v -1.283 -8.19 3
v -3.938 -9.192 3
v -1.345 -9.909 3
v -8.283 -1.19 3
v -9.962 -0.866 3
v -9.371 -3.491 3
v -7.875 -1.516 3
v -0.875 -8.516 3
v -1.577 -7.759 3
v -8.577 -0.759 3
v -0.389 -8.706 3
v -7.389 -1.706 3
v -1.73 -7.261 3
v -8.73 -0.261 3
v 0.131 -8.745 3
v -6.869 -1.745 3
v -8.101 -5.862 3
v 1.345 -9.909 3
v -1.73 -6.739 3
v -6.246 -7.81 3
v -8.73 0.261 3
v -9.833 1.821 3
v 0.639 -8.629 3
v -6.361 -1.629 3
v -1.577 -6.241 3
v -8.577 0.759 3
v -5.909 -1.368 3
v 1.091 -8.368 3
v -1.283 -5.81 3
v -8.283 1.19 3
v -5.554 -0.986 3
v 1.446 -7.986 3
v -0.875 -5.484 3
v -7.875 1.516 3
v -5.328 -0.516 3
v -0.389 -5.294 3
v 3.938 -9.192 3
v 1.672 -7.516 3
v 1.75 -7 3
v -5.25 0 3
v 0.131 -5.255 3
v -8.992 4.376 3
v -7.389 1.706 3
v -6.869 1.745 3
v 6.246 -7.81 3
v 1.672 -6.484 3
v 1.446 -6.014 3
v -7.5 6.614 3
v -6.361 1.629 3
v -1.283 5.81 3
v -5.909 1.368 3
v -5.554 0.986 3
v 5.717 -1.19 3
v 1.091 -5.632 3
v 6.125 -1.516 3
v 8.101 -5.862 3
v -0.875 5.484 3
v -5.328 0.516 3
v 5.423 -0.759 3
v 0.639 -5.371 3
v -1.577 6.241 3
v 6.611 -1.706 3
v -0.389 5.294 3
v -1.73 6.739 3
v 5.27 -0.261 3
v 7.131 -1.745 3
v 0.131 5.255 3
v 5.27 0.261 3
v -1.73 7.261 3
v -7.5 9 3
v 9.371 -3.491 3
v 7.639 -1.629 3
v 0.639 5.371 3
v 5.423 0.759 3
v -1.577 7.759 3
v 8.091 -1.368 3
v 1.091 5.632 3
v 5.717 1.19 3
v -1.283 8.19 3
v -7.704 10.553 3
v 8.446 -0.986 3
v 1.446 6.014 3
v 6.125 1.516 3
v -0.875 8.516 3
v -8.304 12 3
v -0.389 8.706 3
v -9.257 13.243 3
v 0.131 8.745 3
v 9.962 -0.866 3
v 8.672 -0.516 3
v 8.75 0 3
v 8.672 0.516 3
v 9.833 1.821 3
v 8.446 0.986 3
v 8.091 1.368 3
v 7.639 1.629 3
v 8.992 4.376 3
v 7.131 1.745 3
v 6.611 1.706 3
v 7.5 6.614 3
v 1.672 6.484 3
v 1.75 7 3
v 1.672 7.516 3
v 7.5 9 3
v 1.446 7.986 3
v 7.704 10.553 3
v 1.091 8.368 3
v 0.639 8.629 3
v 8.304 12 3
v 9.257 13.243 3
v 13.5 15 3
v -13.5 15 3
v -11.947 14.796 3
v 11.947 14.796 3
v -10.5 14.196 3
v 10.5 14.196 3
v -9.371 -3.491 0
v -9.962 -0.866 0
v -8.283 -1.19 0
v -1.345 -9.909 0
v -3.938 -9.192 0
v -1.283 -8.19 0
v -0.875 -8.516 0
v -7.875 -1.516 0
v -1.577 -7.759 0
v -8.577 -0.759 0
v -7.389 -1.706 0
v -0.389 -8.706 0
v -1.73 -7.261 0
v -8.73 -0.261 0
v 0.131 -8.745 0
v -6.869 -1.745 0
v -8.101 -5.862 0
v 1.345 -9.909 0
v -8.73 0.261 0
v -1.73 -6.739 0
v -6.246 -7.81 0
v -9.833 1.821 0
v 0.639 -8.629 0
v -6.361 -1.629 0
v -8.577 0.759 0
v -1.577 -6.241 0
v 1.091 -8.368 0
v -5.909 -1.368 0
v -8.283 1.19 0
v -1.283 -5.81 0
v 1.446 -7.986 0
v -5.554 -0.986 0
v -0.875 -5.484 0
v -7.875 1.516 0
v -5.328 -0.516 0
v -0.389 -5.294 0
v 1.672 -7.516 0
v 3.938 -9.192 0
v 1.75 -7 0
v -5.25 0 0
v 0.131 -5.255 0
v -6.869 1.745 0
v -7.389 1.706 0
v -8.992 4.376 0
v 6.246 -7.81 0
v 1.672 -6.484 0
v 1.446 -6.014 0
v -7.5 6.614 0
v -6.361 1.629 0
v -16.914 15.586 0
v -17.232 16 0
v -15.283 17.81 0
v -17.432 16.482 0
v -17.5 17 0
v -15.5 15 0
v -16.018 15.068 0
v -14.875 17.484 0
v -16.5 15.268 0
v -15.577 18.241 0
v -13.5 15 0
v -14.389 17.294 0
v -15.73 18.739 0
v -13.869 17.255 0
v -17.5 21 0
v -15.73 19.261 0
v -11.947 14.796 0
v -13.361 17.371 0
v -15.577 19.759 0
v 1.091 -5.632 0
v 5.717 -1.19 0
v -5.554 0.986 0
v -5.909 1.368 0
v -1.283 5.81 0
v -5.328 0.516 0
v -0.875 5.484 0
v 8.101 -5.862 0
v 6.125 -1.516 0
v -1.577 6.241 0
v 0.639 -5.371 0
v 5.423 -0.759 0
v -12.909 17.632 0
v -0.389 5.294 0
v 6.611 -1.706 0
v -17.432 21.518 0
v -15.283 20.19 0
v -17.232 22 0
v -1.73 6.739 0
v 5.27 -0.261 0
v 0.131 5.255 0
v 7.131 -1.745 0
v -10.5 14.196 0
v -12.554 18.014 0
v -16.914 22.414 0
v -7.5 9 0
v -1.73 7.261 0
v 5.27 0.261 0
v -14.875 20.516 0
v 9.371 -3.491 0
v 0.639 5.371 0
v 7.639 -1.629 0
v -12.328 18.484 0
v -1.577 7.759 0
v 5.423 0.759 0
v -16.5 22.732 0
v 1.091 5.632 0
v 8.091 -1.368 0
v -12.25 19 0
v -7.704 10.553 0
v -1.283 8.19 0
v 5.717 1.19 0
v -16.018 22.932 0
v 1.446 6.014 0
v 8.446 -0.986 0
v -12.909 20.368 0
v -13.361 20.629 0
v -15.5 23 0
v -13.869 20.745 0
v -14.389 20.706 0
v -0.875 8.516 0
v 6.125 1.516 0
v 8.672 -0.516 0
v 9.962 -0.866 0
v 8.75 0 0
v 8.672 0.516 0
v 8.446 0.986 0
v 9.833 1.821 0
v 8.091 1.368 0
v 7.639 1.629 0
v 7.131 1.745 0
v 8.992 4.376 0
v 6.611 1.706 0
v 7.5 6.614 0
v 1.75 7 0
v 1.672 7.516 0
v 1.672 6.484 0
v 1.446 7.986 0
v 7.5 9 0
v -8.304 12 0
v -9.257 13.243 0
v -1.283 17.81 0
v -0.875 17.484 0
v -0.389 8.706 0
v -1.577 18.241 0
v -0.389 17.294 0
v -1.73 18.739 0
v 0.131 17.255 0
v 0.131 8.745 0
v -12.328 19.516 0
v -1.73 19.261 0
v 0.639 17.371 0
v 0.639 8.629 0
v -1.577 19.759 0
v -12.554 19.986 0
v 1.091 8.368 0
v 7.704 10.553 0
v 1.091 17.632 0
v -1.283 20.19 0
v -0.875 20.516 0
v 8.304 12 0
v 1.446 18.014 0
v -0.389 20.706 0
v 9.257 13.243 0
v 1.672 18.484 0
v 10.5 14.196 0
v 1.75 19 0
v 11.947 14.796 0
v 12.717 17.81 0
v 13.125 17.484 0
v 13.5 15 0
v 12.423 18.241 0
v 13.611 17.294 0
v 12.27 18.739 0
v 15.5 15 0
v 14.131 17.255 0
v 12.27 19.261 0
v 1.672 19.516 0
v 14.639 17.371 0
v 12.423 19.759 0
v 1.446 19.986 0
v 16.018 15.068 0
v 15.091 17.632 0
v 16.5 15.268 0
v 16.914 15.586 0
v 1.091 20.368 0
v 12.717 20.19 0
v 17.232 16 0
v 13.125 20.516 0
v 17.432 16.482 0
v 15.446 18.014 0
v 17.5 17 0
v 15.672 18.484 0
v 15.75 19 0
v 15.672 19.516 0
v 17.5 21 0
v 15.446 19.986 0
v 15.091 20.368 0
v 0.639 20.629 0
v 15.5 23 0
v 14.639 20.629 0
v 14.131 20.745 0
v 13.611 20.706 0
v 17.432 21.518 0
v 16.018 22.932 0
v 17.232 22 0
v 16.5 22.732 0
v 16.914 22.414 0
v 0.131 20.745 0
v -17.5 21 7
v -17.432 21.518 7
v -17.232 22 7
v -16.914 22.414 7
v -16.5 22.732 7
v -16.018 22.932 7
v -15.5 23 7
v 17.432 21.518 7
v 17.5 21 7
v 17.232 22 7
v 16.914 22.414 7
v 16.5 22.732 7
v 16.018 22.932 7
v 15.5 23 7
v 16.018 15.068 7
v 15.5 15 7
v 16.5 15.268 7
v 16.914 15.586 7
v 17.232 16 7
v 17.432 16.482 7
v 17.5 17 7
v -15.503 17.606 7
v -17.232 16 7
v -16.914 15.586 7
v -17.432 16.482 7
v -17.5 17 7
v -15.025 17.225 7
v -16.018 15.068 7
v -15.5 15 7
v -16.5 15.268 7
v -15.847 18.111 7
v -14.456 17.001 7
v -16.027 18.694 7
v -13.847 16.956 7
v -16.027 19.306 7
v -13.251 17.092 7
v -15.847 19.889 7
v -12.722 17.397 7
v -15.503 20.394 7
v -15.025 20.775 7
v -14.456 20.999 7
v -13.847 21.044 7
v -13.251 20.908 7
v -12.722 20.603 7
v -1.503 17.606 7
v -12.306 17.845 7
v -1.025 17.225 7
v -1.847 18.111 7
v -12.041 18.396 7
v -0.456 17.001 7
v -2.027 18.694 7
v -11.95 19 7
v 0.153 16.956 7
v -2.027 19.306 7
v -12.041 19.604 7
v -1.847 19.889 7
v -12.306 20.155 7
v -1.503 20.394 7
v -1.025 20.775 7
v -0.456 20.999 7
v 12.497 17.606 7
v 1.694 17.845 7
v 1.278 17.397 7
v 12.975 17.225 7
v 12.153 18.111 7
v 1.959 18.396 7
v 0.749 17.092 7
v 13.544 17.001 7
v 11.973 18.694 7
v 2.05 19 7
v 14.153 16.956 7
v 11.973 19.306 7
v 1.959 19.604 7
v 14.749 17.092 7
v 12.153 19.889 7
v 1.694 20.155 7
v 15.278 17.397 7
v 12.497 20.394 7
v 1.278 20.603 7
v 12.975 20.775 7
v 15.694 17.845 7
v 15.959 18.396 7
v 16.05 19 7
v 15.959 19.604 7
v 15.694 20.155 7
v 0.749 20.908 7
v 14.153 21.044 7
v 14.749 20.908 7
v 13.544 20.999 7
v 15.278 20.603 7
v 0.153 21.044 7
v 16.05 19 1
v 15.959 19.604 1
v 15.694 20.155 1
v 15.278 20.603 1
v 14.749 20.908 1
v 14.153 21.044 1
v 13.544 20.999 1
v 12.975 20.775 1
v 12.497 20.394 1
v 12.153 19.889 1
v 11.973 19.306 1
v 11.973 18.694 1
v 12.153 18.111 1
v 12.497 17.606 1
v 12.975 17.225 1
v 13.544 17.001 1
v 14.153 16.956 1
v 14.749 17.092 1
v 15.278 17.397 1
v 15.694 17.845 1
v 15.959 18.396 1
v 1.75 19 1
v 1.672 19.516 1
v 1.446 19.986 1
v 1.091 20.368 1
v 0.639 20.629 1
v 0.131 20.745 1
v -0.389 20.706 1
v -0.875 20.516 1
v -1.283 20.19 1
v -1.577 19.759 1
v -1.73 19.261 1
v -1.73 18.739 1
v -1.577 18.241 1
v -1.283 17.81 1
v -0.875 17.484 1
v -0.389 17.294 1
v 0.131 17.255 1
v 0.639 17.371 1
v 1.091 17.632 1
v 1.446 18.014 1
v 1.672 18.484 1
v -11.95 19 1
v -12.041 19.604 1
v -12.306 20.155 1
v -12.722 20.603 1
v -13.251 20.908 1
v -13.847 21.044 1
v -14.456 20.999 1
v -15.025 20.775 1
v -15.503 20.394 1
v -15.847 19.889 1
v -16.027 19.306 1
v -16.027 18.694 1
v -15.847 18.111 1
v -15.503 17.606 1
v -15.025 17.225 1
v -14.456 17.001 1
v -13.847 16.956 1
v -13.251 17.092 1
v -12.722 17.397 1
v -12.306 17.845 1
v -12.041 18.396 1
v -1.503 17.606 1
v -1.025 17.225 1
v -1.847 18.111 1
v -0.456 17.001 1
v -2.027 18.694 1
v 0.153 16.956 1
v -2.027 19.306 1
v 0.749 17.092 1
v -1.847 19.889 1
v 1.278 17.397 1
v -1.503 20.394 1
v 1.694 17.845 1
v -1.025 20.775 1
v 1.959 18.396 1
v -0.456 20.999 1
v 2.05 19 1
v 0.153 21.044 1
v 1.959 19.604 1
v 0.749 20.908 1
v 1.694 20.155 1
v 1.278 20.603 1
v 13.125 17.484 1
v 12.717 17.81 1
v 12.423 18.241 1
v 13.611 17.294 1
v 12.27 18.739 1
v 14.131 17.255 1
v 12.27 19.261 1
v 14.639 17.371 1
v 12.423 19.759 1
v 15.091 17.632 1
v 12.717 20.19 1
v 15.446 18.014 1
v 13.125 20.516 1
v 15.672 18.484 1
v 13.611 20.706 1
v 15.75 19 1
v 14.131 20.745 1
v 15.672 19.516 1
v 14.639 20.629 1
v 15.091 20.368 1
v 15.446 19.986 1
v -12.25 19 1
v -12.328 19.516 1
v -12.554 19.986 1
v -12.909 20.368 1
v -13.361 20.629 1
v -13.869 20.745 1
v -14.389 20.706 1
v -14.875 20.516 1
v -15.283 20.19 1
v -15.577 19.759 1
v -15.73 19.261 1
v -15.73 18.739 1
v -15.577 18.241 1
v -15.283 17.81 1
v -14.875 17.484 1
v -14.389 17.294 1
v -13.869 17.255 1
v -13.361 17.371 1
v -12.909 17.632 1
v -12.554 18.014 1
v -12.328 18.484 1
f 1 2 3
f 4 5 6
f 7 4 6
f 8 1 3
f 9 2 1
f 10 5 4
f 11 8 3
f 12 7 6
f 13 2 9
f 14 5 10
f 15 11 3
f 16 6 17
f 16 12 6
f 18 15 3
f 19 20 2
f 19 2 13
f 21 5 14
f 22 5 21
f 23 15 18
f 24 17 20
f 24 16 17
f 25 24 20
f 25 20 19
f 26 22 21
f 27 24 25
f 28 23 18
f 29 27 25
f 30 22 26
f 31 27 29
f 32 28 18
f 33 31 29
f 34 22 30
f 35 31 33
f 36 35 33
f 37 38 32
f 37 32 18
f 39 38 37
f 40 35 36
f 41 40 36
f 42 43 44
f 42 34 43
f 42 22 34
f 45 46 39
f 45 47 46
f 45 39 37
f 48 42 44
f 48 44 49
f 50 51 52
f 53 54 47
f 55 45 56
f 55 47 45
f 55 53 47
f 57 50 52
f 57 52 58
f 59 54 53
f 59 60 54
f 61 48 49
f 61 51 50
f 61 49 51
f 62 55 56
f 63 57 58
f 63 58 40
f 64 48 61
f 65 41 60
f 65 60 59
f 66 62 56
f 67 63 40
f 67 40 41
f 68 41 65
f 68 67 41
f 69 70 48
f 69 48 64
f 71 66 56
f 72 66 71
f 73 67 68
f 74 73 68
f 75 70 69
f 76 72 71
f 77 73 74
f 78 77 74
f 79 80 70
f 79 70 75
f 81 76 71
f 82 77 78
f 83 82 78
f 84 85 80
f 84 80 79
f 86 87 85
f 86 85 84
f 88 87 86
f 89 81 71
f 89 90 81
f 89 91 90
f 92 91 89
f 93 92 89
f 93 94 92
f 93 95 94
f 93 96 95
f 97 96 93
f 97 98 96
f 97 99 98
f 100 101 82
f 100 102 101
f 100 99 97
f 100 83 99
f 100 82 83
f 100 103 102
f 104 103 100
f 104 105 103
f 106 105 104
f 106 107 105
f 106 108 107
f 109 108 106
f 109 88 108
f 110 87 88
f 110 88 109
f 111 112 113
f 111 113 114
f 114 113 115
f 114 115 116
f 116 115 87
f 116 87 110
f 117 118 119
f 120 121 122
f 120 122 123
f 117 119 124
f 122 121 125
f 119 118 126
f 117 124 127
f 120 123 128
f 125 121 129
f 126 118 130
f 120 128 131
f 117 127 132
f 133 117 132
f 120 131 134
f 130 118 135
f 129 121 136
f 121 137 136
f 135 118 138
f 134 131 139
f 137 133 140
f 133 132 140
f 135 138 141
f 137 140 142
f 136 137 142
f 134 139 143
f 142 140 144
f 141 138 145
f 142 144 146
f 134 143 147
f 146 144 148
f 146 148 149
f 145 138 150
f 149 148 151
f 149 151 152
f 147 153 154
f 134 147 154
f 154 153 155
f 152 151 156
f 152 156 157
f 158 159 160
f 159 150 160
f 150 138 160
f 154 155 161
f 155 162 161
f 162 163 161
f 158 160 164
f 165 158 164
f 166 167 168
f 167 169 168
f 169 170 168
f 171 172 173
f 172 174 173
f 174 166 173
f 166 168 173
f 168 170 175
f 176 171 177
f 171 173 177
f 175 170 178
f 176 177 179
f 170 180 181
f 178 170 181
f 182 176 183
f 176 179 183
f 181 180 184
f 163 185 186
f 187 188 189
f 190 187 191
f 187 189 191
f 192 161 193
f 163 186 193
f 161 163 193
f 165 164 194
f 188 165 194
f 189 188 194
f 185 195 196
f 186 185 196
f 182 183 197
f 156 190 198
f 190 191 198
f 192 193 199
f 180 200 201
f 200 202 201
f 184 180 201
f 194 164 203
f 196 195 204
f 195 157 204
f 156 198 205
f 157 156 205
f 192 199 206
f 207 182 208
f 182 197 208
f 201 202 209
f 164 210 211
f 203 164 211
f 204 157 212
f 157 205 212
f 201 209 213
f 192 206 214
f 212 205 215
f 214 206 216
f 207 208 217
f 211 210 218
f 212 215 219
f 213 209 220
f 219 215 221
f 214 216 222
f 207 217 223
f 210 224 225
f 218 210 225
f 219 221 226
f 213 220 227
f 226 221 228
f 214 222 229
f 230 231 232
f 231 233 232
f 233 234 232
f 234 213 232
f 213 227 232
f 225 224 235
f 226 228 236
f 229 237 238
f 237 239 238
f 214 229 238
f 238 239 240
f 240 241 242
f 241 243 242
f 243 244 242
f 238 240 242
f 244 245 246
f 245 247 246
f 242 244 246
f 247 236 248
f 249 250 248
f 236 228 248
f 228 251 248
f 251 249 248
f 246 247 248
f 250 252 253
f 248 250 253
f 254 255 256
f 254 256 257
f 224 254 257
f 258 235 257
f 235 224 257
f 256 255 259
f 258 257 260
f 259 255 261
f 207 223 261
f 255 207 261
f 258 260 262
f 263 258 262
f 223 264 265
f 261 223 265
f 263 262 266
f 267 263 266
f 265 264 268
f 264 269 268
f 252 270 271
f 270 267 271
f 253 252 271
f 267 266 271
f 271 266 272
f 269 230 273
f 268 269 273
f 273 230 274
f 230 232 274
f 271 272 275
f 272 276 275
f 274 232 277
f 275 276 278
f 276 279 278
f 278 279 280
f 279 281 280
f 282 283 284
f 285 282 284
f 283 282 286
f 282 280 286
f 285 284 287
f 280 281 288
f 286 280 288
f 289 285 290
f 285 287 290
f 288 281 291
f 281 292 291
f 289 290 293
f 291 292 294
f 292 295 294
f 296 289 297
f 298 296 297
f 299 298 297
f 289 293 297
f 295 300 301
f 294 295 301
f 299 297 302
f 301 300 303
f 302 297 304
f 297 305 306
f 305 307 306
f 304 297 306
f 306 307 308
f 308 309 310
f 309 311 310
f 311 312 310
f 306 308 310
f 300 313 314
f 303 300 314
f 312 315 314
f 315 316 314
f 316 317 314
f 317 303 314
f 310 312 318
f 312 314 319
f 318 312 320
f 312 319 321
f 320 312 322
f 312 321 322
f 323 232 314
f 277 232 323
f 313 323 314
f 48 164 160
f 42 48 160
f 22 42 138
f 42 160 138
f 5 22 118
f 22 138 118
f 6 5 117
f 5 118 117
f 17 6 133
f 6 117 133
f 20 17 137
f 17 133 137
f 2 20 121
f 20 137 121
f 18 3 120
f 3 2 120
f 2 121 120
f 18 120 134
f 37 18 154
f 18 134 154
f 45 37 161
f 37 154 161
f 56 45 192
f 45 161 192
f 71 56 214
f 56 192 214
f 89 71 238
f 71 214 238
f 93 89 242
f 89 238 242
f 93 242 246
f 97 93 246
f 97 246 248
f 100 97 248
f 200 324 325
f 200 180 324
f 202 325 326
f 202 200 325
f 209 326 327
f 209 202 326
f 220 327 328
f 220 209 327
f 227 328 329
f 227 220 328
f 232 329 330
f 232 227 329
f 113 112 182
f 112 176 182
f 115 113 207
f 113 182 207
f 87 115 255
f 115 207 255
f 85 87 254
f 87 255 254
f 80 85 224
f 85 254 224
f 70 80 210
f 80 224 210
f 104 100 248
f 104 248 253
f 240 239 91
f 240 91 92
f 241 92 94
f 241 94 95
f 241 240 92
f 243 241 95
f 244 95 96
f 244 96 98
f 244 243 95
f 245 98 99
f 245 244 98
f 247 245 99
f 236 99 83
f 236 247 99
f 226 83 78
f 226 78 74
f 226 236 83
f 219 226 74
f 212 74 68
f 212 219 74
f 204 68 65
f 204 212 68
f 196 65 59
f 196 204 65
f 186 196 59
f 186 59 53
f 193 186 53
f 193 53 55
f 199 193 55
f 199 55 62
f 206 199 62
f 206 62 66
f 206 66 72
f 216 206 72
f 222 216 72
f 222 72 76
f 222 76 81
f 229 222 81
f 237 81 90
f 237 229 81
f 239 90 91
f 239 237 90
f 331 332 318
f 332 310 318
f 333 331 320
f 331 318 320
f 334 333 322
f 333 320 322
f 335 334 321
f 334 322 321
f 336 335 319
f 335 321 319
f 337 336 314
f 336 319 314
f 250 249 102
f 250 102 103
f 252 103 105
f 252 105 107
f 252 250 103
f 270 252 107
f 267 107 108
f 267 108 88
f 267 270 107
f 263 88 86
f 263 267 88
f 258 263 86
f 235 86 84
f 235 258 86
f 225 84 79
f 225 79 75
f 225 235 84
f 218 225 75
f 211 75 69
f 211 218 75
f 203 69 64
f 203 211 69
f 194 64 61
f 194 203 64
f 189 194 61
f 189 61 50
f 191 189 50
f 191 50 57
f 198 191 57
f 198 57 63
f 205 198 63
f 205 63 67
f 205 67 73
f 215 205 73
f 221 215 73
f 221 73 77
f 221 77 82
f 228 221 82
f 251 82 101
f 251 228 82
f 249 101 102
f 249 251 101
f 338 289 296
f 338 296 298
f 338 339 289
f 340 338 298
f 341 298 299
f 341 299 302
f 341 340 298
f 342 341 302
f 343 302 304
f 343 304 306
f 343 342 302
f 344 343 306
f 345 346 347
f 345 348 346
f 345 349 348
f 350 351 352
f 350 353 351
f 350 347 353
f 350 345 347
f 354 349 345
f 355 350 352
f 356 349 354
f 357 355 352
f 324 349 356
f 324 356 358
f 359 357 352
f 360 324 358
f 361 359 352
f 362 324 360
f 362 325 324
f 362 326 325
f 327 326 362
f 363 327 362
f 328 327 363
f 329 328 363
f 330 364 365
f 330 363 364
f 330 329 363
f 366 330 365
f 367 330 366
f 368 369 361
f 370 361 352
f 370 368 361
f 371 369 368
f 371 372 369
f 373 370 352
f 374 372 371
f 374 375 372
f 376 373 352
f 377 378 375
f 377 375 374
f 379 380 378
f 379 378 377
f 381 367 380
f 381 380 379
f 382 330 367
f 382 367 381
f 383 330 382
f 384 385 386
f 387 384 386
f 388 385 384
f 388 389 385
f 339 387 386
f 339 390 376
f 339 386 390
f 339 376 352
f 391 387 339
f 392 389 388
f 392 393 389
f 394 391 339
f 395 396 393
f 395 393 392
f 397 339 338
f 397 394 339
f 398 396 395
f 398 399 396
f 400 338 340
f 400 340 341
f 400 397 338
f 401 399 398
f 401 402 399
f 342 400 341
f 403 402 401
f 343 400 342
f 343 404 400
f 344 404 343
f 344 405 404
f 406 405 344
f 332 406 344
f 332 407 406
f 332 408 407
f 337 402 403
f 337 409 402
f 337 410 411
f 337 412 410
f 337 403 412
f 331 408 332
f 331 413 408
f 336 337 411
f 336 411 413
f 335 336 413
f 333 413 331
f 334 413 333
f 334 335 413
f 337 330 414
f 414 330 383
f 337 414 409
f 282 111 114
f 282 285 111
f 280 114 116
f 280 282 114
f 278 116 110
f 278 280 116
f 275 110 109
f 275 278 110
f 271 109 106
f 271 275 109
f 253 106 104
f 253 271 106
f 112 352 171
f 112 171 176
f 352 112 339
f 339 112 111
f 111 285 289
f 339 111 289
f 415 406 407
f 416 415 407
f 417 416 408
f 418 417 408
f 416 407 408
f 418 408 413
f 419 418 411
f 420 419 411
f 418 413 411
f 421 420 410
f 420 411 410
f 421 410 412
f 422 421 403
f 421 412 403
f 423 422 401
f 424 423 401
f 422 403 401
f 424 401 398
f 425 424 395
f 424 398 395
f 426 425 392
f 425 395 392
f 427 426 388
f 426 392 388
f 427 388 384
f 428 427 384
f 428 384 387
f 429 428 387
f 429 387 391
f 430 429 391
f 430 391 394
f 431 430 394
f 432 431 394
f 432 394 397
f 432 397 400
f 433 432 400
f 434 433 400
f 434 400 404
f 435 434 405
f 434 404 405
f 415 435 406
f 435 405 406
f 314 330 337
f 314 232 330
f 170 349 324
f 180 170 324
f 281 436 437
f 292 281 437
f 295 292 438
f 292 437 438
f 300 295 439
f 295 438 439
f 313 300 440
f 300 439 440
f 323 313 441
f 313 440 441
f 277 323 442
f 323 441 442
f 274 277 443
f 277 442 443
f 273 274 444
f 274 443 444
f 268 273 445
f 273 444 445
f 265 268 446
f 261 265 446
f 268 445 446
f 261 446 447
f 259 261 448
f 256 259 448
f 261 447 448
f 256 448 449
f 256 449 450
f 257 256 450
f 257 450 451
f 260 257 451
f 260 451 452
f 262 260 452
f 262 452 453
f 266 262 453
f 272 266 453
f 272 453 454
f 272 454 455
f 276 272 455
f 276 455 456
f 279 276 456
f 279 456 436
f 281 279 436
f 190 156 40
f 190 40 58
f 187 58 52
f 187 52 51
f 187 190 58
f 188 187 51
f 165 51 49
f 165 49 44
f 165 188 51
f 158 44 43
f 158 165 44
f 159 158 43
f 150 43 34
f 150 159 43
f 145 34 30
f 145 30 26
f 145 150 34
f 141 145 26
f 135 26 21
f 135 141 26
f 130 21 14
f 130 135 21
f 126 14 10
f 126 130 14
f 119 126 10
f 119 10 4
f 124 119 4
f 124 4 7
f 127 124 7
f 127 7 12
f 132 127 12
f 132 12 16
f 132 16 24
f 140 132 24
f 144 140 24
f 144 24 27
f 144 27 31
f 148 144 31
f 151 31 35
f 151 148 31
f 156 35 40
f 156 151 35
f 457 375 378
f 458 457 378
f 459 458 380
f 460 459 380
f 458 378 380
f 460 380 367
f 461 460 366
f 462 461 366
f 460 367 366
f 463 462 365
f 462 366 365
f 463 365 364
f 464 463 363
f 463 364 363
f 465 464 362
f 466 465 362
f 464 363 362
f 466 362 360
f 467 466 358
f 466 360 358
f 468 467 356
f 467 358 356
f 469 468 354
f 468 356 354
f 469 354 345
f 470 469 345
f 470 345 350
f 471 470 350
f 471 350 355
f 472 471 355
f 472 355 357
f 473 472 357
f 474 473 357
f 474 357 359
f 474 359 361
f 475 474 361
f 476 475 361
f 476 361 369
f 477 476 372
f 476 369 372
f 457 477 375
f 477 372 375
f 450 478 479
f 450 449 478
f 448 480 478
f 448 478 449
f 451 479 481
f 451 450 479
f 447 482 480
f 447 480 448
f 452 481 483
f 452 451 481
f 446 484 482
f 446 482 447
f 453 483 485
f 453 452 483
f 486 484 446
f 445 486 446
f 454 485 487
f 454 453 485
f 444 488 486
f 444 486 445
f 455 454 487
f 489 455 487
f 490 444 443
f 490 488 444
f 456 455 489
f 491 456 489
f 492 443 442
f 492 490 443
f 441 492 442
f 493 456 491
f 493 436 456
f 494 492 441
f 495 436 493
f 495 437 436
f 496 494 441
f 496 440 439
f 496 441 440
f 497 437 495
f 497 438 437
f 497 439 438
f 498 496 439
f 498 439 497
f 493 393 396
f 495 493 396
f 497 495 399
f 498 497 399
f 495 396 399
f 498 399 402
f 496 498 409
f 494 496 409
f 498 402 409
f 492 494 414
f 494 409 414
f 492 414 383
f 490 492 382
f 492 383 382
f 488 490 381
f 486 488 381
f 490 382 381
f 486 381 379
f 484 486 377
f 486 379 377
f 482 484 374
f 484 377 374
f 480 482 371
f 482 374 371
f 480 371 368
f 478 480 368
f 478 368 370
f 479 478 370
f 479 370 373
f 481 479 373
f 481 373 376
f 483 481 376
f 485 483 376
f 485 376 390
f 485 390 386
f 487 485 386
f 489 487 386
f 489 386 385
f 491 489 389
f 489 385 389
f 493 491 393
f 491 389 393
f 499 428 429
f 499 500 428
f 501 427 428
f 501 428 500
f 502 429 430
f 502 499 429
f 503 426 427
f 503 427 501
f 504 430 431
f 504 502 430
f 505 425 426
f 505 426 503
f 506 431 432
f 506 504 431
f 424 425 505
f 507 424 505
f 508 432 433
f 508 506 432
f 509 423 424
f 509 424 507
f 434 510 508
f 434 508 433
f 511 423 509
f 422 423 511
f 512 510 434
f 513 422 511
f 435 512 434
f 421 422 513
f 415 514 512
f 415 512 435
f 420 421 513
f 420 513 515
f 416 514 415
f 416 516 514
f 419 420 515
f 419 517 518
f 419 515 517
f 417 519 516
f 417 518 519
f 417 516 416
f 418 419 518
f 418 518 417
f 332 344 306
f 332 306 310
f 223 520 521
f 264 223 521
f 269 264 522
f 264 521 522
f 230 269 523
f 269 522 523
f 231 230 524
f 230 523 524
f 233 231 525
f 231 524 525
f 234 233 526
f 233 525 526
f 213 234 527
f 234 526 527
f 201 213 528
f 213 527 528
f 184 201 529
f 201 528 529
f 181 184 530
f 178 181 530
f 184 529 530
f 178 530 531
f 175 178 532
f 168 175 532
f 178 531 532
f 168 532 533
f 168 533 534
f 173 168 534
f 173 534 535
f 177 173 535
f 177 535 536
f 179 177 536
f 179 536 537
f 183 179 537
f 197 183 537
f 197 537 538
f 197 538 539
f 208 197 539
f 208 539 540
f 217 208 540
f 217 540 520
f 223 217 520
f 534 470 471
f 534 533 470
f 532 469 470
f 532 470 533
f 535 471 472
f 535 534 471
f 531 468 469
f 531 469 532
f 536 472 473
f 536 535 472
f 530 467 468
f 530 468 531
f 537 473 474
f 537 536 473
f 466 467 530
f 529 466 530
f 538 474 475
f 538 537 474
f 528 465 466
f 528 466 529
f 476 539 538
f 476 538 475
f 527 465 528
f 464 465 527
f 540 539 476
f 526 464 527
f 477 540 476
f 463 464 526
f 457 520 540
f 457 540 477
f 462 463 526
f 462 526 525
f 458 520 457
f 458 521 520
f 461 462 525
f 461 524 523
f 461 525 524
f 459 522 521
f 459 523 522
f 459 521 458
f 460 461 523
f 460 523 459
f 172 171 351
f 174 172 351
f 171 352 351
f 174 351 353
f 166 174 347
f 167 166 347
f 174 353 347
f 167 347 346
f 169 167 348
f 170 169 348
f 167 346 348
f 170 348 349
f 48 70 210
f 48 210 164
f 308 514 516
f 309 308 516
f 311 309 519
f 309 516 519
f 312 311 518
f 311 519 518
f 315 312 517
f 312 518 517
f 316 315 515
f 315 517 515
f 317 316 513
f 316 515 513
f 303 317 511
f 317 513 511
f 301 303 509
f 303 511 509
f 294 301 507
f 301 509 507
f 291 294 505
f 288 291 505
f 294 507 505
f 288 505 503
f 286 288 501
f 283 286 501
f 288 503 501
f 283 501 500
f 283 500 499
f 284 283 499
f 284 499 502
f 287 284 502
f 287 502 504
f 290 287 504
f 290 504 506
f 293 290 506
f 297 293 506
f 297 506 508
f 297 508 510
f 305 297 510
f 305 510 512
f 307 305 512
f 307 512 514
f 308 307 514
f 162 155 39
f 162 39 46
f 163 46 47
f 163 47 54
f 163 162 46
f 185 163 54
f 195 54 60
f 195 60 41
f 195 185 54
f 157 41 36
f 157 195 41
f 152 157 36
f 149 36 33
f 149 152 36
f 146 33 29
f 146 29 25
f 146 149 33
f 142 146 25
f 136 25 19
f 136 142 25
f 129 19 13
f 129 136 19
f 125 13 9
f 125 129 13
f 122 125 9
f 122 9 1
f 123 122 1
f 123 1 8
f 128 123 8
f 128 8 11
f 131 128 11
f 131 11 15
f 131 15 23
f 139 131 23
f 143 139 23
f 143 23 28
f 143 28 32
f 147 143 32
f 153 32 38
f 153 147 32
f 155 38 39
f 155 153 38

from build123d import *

# Parameters (mm, degrees)
SKETCH_1_R          = 10
SKETCH_1_R_2        = 1.75
EXTRUDE_1_DEPTH     = 3
EXTRUDE_2_DEPTH     = 3
SKETCH_7_W          = 35
SKETCH_7_H          = 8
EXTRUDE_3_DEPTH     = 4
FILLET_1_R          = 6
SKETCH_8_R          = 1.75
CUT_EXTRUDE_2_DEPTH = 8
FILLET_2_R          = 2
SKETCH_10_R         = 2.05
CUT_EXTRUDE_3_DEPTH = 6


with BuildPart() as part:
    # Эскиз1 → Бобышка-Вытянуть1 (new body)
    with BuildSketch(Plane.XY):
        Circle(SKETCH_1_R)
        with Locations((-7, 0)):
            Circle(SKETCH_1_R_2, mode=Mode.SUBTRACT)
        with Locations((0, 7)):
            Circle(SKETCH_1_R_2, mode=Mode.SUBTRACT)
        with Locations((7, 0)):
            Circle(SKETCH_1_R_2, mode=Mode.SUBTRACT)
        with Locations((0, -7)):
            Circle(SKETCH_1_R_2, mode=Mode.SUBTRACT)
    extrude(amount=EXTRUDE_1_DEPTH)

    # Эскиз6 → Бобышка-Вытянуть2 (add)
    with BuildSketch(Plane.XY.offset(3)):
        with BuildLine():
            Line((-7.5, 15), (-7.5, 6.614378278))
            ThreePointArc((-7.5, 6.614378278), (0, 10), (7.5, 6.614378278))
            Line((7.5, 6.614378278), (7.5, 15))
            Line((7.5, 15), (17.5, 15))
            Line((17.5, 15), (17.5, 23))
            Line((17.5, 23), (-17.5, 23))
            Line((-17.5, 23), (-17.5, 15))
            Line((-17.5, 15), (-7.5, 15))
        make_face()
    extrude(amount=-EXTRUDE_2_DEPTH)

    # Эскиз7 → Бобышка-Вытянуть3 (add)
    with BuildSketch(Plane.XY.offset(3)):
        with Locations((0, 19)):
            Rectangle(SKETCH_7_W, SKETCH_7_H)
    extrude(amount=EXTRUDE_3_DEPTH)

    # Скругление1
    fillet_1_edges = [part.edges().sort_by_distance(p)[0] for p in [
        (-7.5, 15, 1.5),
        (7.5, 15, 1.5),
    ]]
    fillet(fillet_1_edges, radius=FILLET_1_R)

    # Эскиз8 → Вырез-Вытянуть2 (cut, through all)
    with BuildSketch(Plane.XY.offset(7)):
        with Locations((0, 19)):
            Circle(SKETCH_8_R)
        with Locations((-14, 19)):
            Circle(SKETCH_8_R)
        with Locations((14, 19)):
            Circle(SKETCH_8_R)
    extrude(amount=-CUT_EXTRUDE_2_DEPTH, mode=Mode.SUBTRACT)

    # Скругление2
    fillet_2_edges = [part.edges().sort_by_distance(p)[0] for p in [
        (-17.5, 15, 3.5),
        (-17.5, 23, 3.5),
        (17.5, 23, 3.5),
        (17.5, 15, 3.5),
    ]]
    fillet(fillet_2_edges, radius=FILLET_2_R)

    # Эскиз10 → Вырез-Вытянуть3 (cut)
    with BuildSketch(Plane.XY.offset(7)):
        with Locations((-14, 19)):
            Circle(SKETCH_10_R)
        with Locations((0, 19)):
            Circle(SKETCH_10_R)
        with Locations((14, 19)):
            Circle(SKETCH_10_R)
    extrude(amount=-CUT_EXTRUDE_3_DEPTH, mode=Mode.SUBTRACT)


solid = part.part
